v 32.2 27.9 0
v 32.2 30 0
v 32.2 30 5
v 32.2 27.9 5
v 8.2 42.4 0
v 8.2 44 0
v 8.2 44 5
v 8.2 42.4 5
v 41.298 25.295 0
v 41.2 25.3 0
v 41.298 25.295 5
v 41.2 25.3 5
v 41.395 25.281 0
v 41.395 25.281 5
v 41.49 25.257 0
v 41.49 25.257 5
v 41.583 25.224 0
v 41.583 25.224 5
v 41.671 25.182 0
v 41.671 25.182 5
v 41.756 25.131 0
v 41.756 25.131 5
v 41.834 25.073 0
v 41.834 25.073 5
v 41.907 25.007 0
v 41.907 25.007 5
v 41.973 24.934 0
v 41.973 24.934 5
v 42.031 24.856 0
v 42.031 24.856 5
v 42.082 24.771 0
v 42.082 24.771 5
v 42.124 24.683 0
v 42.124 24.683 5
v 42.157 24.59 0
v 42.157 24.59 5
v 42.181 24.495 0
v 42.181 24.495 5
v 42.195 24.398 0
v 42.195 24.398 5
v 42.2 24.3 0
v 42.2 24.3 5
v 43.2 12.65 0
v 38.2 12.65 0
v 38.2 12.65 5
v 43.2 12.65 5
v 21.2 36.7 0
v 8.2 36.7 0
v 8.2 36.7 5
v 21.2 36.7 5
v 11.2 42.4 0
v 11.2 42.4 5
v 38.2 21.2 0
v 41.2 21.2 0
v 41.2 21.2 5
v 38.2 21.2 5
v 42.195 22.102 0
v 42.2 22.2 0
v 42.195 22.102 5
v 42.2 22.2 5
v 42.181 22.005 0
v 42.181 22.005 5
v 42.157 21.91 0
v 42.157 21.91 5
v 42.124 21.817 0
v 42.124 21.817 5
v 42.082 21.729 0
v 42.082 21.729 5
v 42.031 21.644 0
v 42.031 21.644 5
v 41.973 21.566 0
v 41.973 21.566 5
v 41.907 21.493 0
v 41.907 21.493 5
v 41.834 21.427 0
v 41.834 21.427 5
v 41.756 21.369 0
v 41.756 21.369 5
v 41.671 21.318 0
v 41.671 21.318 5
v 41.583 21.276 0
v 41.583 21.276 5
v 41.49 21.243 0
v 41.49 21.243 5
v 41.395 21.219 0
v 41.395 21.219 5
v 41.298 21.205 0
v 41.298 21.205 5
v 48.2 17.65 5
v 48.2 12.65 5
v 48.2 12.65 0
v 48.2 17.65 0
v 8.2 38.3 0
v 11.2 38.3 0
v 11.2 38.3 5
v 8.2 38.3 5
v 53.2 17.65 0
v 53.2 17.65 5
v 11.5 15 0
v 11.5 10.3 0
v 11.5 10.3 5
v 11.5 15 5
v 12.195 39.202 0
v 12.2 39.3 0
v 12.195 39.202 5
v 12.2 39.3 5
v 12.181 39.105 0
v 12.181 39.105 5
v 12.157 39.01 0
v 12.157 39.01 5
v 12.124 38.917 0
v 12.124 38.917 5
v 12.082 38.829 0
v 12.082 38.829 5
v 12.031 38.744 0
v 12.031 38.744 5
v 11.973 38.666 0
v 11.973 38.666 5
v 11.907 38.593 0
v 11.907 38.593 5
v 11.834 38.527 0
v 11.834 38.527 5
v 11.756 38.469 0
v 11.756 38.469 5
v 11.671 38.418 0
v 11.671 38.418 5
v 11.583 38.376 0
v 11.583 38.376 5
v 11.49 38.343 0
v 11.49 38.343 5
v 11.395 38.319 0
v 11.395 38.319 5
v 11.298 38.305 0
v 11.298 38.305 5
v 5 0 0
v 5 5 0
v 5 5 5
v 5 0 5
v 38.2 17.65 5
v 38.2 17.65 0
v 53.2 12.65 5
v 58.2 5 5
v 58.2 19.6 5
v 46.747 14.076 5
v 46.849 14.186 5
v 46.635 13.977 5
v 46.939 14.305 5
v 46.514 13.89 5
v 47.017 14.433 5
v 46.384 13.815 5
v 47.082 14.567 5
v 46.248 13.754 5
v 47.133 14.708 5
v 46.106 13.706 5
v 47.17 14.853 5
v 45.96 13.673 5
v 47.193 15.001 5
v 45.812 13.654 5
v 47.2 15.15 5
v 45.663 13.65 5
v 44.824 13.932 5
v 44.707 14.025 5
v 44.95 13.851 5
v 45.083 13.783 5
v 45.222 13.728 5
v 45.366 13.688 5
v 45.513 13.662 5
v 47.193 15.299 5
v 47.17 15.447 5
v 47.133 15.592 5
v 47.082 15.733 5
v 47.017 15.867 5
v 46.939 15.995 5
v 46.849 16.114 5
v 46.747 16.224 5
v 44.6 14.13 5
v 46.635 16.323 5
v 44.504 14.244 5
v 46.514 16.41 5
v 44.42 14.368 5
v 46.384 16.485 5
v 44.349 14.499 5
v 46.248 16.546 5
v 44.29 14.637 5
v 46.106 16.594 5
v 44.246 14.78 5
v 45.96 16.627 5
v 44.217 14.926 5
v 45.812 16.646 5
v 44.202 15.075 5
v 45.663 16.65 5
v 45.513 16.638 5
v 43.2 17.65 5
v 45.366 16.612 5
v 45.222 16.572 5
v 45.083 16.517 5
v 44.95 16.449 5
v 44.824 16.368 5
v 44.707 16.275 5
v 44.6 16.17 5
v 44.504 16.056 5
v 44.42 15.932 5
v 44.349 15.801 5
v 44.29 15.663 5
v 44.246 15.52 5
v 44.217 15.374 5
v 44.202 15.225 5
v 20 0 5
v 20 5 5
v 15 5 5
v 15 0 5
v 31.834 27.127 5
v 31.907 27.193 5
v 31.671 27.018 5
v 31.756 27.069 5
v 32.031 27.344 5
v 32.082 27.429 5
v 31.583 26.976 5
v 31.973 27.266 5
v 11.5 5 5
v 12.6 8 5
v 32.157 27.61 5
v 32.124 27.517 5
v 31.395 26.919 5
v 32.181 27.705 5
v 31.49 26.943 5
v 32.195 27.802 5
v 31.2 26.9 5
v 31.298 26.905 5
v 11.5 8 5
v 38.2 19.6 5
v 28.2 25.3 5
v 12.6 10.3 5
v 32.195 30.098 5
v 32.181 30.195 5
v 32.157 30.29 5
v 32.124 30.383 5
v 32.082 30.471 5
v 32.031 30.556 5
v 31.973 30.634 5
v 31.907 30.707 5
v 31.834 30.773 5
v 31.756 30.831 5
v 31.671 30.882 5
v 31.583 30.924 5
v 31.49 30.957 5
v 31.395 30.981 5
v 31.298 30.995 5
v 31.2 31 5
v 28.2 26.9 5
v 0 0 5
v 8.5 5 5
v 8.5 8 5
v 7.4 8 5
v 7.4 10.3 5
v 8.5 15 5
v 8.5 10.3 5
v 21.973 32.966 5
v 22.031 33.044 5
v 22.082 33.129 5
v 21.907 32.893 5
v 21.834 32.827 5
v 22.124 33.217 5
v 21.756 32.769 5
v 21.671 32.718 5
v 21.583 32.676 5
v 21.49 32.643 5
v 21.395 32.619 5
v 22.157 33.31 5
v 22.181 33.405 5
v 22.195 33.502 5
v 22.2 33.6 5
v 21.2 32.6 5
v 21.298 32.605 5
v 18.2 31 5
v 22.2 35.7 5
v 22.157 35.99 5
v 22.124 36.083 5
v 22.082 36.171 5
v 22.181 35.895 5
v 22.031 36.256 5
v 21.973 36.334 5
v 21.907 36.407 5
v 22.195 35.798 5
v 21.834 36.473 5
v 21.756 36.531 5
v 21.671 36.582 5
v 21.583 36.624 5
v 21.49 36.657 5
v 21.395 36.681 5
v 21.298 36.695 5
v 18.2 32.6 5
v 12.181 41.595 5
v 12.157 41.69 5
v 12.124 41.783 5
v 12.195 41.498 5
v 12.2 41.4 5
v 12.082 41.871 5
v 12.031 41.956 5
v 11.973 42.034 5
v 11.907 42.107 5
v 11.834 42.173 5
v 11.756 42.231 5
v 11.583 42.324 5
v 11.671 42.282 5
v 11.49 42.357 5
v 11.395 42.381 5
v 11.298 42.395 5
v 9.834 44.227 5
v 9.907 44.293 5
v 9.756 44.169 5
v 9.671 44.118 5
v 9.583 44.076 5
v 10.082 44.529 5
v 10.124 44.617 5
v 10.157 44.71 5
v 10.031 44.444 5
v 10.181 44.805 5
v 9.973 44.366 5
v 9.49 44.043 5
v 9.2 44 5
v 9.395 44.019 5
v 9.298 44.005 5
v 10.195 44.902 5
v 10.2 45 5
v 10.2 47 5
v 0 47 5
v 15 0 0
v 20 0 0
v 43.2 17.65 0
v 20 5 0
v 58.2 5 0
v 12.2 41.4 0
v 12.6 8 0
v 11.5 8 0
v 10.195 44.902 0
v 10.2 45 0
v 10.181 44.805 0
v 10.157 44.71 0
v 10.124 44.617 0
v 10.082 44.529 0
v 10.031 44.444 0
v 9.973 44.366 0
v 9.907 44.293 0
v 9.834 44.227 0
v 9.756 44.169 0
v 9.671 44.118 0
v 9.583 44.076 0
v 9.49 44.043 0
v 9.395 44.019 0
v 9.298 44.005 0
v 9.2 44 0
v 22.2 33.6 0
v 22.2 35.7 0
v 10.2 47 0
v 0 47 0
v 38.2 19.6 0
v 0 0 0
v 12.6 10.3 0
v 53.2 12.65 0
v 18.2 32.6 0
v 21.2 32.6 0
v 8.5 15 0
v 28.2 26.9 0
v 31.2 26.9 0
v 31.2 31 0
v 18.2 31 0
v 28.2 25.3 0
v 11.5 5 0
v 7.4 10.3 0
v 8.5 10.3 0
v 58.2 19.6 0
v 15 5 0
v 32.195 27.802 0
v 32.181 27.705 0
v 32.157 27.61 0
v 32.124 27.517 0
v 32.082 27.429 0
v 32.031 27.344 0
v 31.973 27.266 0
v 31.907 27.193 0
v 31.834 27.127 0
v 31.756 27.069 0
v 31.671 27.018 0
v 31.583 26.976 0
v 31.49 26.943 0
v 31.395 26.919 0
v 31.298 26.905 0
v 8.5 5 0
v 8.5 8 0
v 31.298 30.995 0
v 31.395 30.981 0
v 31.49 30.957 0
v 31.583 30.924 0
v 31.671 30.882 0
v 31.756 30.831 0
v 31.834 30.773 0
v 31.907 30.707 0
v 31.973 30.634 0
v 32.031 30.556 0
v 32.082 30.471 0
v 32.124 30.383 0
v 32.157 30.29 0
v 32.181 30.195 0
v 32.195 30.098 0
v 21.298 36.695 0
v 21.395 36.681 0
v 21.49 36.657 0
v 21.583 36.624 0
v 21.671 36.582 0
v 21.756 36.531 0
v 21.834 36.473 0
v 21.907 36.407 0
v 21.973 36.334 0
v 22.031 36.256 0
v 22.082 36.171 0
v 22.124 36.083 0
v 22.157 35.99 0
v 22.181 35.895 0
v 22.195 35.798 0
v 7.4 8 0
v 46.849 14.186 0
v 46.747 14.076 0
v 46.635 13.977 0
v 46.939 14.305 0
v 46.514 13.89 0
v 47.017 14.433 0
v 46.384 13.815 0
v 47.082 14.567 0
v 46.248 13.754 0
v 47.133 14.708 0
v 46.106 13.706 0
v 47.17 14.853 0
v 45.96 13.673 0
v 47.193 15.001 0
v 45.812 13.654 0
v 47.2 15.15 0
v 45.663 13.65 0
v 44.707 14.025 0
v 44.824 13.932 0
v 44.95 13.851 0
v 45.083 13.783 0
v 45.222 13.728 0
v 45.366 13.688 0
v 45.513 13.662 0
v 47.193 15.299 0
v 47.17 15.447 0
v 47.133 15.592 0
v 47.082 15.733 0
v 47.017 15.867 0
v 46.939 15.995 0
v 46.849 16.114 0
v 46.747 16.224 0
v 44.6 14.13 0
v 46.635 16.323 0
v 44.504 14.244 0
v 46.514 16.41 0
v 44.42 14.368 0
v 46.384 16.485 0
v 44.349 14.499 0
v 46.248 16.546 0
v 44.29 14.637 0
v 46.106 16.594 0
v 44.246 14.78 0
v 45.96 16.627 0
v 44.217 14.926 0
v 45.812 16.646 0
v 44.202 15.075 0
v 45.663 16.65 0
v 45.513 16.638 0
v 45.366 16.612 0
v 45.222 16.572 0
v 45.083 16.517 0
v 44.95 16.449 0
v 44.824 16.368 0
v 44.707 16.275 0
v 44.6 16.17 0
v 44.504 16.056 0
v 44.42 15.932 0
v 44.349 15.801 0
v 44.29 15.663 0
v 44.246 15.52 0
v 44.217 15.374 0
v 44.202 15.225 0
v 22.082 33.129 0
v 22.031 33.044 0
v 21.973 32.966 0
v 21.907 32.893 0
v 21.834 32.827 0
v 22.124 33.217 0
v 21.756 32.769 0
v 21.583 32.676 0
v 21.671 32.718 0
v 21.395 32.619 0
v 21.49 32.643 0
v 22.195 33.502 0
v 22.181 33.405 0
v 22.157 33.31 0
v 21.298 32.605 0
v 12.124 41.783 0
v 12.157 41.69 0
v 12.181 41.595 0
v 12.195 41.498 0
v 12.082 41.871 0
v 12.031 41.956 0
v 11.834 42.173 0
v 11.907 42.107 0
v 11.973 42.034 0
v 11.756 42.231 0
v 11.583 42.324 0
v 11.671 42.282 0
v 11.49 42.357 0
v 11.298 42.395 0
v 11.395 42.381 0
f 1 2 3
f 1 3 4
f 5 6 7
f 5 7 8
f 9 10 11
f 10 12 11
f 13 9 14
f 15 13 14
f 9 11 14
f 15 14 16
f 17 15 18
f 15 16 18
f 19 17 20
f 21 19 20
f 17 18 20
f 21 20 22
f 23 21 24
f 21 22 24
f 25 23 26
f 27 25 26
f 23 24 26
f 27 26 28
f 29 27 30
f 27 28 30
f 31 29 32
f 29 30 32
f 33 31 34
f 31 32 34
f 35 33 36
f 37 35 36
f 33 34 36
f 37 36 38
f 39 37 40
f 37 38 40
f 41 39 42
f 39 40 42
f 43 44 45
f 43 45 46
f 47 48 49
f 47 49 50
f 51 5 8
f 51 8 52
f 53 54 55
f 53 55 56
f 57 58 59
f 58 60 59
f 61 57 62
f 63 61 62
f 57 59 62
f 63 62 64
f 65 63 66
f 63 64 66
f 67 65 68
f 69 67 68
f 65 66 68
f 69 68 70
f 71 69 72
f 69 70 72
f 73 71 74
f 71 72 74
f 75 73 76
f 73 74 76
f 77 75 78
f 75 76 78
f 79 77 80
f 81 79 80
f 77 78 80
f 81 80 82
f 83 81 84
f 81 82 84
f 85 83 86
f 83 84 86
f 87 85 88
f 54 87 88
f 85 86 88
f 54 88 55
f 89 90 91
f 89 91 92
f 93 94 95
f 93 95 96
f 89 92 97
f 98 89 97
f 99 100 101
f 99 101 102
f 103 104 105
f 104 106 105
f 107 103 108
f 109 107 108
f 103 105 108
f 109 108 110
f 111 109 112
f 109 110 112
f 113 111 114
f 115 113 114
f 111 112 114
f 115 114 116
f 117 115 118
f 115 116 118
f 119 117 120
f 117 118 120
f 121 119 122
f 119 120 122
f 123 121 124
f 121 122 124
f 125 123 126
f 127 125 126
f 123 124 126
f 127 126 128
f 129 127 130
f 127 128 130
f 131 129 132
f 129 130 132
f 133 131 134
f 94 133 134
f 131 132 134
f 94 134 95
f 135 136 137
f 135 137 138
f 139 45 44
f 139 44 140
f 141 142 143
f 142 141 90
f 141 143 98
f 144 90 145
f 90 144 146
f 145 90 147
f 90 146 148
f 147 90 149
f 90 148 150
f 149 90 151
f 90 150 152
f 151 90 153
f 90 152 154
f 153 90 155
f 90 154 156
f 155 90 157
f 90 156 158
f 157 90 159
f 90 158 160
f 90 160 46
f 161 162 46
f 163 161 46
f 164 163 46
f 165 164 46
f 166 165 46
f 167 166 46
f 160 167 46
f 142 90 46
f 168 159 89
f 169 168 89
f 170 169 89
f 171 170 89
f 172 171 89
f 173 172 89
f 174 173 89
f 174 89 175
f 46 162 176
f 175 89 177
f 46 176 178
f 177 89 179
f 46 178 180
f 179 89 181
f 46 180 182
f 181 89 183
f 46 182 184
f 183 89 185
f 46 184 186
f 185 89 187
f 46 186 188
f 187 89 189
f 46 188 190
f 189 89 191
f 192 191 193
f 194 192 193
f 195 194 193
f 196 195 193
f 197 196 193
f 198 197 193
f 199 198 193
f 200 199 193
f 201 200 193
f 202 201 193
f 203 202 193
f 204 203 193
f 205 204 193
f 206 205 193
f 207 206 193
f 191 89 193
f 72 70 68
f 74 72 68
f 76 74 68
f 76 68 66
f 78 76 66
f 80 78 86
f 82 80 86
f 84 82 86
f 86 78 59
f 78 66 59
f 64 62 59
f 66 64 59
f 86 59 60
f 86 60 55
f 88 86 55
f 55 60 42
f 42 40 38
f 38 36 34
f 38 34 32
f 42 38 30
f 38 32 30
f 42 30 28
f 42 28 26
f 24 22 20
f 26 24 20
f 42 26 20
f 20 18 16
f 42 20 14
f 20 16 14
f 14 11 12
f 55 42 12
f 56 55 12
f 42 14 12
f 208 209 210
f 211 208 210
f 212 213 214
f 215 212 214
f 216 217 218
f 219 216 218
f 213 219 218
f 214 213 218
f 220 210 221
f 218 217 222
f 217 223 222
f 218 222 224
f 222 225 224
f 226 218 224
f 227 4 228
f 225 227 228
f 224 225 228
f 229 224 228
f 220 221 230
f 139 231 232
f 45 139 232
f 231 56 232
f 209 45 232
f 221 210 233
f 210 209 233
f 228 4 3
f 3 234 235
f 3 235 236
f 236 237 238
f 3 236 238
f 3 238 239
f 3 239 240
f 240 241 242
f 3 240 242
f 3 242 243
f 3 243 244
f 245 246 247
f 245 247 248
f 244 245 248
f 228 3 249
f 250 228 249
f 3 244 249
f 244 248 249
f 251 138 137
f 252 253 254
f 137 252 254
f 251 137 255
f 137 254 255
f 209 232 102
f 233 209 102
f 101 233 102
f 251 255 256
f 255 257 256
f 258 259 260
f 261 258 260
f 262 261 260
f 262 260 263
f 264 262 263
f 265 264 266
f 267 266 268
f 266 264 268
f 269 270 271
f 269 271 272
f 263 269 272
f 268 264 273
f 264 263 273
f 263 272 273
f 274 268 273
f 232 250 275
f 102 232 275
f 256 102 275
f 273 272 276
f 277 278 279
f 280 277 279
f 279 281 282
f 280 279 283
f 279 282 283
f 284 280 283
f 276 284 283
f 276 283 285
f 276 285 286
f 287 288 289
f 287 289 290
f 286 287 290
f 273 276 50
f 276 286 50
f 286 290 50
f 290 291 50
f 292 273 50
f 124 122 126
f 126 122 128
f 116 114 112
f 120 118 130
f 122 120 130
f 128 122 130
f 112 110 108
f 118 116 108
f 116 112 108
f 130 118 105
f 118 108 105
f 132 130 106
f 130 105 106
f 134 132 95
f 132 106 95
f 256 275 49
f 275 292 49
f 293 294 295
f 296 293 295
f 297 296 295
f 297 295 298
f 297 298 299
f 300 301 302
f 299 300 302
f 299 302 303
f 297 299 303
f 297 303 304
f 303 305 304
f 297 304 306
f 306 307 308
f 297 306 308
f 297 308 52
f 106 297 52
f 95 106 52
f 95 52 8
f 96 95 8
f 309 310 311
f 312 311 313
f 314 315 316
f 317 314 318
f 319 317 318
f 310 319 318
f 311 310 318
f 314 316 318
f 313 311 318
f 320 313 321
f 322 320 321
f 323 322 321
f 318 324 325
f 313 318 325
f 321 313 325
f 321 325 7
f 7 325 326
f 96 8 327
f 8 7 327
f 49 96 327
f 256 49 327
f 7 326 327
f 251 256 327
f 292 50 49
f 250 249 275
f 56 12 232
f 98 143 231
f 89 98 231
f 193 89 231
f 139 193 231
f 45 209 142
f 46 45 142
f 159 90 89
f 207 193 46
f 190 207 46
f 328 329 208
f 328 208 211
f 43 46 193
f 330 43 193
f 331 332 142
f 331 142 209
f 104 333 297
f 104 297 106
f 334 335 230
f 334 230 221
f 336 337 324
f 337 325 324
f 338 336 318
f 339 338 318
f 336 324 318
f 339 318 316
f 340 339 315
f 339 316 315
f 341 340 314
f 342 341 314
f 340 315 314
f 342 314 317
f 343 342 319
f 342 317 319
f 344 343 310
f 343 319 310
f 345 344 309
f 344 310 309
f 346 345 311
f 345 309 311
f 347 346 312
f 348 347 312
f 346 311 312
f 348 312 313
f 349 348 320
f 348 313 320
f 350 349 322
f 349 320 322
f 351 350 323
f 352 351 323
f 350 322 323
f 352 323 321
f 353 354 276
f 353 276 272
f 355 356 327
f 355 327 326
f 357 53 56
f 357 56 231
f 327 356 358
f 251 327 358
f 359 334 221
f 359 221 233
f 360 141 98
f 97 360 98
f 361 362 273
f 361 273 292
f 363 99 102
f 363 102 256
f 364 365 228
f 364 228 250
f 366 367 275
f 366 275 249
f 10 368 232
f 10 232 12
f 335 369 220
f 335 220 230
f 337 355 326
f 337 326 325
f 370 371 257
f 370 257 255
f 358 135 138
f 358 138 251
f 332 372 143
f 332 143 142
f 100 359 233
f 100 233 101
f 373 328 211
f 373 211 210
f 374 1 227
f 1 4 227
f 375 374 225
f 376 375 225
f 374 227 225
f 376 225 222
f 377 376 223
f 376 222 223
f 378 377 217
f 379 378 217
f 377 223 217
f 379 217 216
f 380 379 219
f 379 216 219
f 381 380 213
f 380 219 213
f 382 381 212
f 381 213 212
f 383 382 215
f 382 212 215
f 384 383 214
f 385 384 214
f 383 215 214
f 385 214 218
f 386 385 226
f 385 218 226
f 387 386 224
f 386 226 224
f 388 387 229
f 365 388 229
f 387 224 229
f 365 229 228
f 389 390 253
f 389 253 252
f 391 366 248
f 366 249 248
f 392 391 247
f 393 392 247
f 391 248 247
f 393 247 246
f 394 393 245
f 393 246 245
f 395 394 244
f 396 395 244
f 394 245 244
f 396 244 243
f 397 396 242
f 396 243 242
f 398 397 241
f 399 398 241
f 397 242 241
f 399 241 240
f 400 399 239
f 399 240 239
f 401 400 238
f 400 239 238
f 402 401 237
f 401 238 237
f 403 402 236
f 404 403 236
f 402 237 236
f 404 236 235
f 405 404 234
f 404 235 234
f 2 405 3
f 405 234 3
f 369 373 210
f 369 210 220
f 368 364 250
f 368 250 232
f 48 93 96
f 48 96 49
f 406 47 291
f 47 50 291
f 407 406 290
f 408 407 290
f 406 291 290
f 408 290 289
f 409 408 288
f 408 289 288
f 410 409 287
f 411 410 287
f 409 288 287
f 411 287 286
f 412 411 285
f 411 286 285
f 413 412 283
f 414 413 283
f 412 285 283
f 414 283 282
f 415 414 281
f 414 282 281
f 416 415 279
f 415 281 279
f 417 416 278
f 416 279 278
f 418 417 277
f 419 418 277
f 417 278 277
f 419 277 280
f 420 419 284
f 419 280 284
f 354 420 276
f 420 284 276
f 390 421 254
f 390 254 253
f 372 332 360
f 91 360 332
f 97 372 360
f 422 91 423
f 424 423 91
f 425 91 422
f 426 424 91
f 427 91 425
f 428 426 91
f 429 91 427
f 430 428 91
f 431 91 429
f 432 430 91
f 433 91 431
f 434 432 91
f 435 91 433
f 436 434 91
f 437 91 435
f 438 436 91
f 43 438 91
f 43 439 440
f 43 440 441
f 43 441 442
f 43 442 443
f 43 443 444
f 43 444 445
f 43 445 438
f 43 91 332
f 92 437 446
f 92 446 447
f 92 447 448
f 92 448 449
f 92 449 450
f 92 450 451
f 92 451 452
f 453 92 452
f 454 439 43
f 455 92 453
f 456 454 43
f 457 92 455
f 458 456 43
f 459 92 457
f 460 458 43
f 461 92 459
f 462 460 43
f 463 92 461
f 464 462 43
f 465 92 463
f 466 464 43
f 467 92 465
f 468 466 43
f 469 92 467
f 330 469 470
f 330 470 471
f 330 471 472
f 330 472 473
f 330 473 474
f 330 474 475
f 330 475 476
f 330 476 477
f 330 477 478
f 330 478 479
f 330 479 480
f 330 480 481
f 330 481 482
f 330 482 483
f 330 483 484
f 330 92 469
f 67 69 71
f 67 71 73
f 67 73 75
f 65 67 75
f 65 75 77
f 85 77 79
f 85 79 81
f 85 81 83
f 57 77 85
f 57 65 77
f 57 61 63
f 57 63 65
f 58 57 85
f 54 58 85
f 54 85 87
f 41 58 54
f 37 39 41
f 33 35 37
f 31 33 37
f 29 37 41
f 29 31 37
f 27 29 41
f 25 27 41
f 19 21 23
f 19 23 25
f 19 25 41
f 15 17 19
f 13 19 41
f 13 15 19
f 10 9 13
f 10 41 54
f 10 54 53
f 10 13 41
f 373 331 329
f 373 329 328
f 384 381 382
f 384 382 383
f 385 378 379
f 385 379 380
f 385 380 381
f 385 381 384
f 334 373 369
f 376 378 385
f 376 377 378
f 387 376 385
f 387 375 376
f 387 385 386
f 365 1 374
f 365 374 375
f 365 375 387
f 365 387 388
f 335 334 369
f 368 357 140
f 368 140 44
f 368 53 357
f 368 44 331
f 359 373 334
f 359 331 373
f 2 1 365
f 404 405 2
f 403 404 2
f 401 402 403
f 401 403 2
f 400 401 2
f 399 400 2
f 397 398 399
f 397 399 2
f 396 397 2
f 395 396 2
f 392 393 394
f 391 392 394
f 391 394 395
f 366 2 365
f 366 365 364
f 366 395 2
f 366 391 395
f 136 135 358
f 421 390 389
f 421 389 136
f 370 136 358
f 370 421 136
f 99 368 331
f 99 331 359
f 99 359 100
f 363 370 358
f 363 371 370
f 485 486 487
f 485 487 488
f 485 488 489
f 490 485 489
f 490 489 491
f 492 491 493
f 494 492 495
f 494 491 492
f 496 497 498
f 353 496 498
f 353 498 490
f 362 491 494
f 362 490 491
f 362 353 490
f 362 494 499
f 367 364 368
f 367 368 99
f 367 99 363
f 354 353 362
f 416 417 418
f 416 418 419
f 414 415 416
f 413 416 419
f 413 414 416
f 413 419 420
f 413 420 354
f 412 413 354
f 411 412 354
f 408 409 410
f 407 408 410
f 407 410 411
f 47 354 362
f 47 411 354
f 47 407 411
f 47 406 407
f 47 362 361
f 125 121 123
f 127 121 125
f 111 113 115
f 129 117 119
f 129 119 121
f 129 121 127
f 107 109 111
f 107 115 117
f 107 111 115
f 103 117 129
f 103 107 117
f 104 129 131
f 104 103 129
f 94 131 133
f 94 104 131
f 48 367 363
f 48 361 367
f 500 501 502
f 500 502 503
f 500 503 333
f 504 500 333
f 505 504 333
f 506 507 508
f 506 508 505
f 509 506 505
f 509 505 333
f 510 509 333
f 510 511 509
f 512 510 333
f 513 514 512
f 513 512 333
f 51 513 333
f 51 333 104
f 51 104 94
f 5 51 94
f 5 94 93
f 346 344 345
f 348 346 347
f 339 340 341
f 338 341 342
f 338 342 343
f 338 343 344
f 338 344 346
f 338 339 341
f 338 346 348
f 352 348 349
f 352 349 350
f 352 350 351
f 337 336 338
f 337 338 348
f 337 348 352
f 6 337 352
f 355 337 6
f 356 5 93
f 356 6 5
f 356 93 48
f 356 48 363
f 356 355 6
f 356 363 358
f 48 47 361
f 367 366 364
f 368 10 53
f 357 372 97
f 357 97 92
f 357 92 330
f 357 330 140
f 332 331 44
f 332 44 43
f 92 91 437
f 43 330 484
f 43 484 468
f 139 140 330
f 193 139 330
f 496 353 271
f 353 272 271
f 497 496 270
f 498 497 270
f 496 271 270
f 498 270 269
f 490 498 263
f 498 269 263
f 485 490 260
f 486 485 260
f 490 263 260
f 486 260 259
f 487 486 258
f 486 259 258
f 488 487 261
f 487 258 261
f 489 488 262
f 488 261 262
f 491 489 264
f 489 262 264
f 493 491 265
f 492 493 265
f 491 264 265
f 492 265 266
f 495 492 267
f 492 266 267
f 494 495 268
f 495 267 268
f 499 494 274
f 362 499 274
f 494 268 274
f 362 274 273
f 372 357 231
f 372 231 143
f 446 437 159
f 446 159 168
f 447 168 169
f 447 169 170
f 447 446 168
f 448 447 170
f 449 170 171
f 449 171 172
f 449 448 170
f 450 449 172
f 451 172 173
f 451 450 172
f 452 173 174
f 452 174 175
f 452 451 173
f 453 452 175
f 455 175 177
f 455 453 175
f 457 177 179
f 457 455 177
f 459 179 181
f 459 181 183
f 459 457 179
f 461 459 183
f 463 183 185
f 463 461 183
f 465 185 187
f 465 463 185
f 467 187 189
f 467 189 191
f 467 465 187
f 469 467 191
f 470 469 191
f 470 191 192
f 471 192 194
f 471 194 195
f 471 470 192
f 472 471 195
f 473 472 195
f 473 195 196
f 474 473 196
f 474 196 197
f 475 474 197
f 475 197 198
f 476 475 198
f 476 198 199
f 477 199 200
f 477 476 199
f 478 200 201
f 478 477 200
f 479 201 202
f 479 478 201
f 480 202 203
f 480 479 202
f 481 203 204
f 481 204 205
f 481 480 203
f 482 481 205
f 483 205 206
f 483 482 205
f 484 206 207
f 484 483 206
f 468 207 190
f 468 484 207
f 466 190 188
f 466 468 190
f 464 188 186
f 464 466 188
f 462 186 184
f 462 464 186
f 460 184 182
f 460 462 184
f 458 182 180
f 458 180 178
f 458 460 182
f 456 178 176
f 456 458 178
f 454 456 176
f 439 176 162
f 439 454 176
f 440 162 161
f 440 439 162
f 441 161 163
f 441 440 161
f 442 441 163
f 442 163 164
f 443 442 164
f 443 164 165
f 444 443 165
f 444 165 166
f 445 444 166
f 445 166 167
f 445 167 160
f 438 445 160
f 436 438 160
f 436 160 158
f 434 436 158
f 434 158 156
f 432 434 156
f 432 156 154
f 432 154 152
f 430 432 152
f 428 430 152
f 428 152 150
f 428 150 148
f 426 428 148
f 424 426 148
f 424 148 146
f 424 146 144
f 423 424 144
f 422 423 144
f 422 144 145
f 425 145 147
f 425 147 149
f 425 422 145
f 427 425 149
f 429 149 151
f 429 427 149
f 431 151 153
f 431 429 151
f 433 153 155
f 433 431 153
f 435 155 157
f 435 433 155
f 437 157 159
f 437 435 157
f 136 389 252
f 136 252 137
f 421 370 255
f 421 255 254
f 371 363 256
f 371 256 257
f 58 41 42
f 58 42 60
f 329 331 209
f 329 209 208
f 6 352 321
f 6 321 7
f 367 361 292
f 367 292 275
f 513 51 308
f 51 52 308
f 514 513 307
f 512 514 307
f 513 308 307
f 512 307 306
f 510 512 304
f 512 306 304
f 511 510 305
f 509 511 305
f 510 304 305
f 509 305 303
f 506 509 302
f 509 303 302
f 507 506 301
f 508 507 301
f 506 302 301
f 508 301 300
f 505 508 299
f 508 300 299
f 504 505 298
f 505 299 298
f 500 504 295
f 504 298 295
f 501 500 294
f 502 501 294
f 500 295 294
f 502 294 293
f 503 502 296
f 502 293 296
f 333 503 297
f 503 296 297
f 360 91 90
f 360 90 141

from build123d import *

# Parameters (mm, degrees)
SKETCH1_R           = 1.5
SKETCH1_W           = 5
SKETCH1_H           = 5
BOSS_EXTRUDE1_DEPTH = 5
FILLET3_R           = 1


with BuildPart() as part:
    # Sketch1 → Boss-Extrude1 (new body)
    with BuildSketch(Plane.XY):
        Polygon((0, 5), (0, 19.982808697), (0, 31), (0, 30.1), (0, 47), (10.2, 47), (10.2, 44), (8.2, 44), (8.2, 42.4), (12.2, 42.4), (12.2, 38.3), (8.2, 38.3), (8.2, 36.7), (22.2, 36.7), (22.2, 32.6), (18.2, 32.6), (18.2, 31), (32.2, 31), (32.2, 26.9), (28.2, 26.9), (28.2, 25.3), (42.2, 25.3), (42.2, 21.2), (38.2, 21.2), (38.2, 19.6), (58.2, 19.6), (58.2, 5), (20, 5), (20, 0), (15, 0), (15, 5), (11.5, 5), (11.5, 8), (12.6, 8), (12.6, 10.3), (11.5, 10.3), (11.5, 15), (8.5, 15), (8.5, 10.3), (7.4, 10.3), (7.4, 8), (8.5, 8), (8.5, 5), (5, 5), (5, 0), (0, 0), align=None)
        with Locations((45.7, 15.15)):
            Circle(SKETCH1_R, mode=Mode.SUBTRACT)
        with Locations((40.7, 15.15)):
            Rectangle(SKETCH1_W, SKETCH1_H, mode=Mode.SUBTRACT)
        with Locations((50.7, 15.15)):
            Rectangle(SKETCH1_W, SKETCH1_H, mode=Mode.SUBTRACT)
    extrude(amount=BOSS_EXTRUDE1_DEPTH)

    # Fillet3
    fillet3_edges = [part.edges().sort_by_distance(p)[0] for p in [
        (10.2, 44, 2.5),
        (12.2, 42.4, 2.5),
        (12.2, 38.3, 2.5),
        (22.2, 36.7, 2.5),
        (22.2, 32.6, 2.5),
        (32.2, 31, 2.5),
        (32.2, 26.9, 2.5),
        (42.2, 25.3, 2.5),
        (42.2, 21.2, 2.5),
    ]]
    fillet(fillet3_edges, radius=FILLET3_R)


solid = part.part
